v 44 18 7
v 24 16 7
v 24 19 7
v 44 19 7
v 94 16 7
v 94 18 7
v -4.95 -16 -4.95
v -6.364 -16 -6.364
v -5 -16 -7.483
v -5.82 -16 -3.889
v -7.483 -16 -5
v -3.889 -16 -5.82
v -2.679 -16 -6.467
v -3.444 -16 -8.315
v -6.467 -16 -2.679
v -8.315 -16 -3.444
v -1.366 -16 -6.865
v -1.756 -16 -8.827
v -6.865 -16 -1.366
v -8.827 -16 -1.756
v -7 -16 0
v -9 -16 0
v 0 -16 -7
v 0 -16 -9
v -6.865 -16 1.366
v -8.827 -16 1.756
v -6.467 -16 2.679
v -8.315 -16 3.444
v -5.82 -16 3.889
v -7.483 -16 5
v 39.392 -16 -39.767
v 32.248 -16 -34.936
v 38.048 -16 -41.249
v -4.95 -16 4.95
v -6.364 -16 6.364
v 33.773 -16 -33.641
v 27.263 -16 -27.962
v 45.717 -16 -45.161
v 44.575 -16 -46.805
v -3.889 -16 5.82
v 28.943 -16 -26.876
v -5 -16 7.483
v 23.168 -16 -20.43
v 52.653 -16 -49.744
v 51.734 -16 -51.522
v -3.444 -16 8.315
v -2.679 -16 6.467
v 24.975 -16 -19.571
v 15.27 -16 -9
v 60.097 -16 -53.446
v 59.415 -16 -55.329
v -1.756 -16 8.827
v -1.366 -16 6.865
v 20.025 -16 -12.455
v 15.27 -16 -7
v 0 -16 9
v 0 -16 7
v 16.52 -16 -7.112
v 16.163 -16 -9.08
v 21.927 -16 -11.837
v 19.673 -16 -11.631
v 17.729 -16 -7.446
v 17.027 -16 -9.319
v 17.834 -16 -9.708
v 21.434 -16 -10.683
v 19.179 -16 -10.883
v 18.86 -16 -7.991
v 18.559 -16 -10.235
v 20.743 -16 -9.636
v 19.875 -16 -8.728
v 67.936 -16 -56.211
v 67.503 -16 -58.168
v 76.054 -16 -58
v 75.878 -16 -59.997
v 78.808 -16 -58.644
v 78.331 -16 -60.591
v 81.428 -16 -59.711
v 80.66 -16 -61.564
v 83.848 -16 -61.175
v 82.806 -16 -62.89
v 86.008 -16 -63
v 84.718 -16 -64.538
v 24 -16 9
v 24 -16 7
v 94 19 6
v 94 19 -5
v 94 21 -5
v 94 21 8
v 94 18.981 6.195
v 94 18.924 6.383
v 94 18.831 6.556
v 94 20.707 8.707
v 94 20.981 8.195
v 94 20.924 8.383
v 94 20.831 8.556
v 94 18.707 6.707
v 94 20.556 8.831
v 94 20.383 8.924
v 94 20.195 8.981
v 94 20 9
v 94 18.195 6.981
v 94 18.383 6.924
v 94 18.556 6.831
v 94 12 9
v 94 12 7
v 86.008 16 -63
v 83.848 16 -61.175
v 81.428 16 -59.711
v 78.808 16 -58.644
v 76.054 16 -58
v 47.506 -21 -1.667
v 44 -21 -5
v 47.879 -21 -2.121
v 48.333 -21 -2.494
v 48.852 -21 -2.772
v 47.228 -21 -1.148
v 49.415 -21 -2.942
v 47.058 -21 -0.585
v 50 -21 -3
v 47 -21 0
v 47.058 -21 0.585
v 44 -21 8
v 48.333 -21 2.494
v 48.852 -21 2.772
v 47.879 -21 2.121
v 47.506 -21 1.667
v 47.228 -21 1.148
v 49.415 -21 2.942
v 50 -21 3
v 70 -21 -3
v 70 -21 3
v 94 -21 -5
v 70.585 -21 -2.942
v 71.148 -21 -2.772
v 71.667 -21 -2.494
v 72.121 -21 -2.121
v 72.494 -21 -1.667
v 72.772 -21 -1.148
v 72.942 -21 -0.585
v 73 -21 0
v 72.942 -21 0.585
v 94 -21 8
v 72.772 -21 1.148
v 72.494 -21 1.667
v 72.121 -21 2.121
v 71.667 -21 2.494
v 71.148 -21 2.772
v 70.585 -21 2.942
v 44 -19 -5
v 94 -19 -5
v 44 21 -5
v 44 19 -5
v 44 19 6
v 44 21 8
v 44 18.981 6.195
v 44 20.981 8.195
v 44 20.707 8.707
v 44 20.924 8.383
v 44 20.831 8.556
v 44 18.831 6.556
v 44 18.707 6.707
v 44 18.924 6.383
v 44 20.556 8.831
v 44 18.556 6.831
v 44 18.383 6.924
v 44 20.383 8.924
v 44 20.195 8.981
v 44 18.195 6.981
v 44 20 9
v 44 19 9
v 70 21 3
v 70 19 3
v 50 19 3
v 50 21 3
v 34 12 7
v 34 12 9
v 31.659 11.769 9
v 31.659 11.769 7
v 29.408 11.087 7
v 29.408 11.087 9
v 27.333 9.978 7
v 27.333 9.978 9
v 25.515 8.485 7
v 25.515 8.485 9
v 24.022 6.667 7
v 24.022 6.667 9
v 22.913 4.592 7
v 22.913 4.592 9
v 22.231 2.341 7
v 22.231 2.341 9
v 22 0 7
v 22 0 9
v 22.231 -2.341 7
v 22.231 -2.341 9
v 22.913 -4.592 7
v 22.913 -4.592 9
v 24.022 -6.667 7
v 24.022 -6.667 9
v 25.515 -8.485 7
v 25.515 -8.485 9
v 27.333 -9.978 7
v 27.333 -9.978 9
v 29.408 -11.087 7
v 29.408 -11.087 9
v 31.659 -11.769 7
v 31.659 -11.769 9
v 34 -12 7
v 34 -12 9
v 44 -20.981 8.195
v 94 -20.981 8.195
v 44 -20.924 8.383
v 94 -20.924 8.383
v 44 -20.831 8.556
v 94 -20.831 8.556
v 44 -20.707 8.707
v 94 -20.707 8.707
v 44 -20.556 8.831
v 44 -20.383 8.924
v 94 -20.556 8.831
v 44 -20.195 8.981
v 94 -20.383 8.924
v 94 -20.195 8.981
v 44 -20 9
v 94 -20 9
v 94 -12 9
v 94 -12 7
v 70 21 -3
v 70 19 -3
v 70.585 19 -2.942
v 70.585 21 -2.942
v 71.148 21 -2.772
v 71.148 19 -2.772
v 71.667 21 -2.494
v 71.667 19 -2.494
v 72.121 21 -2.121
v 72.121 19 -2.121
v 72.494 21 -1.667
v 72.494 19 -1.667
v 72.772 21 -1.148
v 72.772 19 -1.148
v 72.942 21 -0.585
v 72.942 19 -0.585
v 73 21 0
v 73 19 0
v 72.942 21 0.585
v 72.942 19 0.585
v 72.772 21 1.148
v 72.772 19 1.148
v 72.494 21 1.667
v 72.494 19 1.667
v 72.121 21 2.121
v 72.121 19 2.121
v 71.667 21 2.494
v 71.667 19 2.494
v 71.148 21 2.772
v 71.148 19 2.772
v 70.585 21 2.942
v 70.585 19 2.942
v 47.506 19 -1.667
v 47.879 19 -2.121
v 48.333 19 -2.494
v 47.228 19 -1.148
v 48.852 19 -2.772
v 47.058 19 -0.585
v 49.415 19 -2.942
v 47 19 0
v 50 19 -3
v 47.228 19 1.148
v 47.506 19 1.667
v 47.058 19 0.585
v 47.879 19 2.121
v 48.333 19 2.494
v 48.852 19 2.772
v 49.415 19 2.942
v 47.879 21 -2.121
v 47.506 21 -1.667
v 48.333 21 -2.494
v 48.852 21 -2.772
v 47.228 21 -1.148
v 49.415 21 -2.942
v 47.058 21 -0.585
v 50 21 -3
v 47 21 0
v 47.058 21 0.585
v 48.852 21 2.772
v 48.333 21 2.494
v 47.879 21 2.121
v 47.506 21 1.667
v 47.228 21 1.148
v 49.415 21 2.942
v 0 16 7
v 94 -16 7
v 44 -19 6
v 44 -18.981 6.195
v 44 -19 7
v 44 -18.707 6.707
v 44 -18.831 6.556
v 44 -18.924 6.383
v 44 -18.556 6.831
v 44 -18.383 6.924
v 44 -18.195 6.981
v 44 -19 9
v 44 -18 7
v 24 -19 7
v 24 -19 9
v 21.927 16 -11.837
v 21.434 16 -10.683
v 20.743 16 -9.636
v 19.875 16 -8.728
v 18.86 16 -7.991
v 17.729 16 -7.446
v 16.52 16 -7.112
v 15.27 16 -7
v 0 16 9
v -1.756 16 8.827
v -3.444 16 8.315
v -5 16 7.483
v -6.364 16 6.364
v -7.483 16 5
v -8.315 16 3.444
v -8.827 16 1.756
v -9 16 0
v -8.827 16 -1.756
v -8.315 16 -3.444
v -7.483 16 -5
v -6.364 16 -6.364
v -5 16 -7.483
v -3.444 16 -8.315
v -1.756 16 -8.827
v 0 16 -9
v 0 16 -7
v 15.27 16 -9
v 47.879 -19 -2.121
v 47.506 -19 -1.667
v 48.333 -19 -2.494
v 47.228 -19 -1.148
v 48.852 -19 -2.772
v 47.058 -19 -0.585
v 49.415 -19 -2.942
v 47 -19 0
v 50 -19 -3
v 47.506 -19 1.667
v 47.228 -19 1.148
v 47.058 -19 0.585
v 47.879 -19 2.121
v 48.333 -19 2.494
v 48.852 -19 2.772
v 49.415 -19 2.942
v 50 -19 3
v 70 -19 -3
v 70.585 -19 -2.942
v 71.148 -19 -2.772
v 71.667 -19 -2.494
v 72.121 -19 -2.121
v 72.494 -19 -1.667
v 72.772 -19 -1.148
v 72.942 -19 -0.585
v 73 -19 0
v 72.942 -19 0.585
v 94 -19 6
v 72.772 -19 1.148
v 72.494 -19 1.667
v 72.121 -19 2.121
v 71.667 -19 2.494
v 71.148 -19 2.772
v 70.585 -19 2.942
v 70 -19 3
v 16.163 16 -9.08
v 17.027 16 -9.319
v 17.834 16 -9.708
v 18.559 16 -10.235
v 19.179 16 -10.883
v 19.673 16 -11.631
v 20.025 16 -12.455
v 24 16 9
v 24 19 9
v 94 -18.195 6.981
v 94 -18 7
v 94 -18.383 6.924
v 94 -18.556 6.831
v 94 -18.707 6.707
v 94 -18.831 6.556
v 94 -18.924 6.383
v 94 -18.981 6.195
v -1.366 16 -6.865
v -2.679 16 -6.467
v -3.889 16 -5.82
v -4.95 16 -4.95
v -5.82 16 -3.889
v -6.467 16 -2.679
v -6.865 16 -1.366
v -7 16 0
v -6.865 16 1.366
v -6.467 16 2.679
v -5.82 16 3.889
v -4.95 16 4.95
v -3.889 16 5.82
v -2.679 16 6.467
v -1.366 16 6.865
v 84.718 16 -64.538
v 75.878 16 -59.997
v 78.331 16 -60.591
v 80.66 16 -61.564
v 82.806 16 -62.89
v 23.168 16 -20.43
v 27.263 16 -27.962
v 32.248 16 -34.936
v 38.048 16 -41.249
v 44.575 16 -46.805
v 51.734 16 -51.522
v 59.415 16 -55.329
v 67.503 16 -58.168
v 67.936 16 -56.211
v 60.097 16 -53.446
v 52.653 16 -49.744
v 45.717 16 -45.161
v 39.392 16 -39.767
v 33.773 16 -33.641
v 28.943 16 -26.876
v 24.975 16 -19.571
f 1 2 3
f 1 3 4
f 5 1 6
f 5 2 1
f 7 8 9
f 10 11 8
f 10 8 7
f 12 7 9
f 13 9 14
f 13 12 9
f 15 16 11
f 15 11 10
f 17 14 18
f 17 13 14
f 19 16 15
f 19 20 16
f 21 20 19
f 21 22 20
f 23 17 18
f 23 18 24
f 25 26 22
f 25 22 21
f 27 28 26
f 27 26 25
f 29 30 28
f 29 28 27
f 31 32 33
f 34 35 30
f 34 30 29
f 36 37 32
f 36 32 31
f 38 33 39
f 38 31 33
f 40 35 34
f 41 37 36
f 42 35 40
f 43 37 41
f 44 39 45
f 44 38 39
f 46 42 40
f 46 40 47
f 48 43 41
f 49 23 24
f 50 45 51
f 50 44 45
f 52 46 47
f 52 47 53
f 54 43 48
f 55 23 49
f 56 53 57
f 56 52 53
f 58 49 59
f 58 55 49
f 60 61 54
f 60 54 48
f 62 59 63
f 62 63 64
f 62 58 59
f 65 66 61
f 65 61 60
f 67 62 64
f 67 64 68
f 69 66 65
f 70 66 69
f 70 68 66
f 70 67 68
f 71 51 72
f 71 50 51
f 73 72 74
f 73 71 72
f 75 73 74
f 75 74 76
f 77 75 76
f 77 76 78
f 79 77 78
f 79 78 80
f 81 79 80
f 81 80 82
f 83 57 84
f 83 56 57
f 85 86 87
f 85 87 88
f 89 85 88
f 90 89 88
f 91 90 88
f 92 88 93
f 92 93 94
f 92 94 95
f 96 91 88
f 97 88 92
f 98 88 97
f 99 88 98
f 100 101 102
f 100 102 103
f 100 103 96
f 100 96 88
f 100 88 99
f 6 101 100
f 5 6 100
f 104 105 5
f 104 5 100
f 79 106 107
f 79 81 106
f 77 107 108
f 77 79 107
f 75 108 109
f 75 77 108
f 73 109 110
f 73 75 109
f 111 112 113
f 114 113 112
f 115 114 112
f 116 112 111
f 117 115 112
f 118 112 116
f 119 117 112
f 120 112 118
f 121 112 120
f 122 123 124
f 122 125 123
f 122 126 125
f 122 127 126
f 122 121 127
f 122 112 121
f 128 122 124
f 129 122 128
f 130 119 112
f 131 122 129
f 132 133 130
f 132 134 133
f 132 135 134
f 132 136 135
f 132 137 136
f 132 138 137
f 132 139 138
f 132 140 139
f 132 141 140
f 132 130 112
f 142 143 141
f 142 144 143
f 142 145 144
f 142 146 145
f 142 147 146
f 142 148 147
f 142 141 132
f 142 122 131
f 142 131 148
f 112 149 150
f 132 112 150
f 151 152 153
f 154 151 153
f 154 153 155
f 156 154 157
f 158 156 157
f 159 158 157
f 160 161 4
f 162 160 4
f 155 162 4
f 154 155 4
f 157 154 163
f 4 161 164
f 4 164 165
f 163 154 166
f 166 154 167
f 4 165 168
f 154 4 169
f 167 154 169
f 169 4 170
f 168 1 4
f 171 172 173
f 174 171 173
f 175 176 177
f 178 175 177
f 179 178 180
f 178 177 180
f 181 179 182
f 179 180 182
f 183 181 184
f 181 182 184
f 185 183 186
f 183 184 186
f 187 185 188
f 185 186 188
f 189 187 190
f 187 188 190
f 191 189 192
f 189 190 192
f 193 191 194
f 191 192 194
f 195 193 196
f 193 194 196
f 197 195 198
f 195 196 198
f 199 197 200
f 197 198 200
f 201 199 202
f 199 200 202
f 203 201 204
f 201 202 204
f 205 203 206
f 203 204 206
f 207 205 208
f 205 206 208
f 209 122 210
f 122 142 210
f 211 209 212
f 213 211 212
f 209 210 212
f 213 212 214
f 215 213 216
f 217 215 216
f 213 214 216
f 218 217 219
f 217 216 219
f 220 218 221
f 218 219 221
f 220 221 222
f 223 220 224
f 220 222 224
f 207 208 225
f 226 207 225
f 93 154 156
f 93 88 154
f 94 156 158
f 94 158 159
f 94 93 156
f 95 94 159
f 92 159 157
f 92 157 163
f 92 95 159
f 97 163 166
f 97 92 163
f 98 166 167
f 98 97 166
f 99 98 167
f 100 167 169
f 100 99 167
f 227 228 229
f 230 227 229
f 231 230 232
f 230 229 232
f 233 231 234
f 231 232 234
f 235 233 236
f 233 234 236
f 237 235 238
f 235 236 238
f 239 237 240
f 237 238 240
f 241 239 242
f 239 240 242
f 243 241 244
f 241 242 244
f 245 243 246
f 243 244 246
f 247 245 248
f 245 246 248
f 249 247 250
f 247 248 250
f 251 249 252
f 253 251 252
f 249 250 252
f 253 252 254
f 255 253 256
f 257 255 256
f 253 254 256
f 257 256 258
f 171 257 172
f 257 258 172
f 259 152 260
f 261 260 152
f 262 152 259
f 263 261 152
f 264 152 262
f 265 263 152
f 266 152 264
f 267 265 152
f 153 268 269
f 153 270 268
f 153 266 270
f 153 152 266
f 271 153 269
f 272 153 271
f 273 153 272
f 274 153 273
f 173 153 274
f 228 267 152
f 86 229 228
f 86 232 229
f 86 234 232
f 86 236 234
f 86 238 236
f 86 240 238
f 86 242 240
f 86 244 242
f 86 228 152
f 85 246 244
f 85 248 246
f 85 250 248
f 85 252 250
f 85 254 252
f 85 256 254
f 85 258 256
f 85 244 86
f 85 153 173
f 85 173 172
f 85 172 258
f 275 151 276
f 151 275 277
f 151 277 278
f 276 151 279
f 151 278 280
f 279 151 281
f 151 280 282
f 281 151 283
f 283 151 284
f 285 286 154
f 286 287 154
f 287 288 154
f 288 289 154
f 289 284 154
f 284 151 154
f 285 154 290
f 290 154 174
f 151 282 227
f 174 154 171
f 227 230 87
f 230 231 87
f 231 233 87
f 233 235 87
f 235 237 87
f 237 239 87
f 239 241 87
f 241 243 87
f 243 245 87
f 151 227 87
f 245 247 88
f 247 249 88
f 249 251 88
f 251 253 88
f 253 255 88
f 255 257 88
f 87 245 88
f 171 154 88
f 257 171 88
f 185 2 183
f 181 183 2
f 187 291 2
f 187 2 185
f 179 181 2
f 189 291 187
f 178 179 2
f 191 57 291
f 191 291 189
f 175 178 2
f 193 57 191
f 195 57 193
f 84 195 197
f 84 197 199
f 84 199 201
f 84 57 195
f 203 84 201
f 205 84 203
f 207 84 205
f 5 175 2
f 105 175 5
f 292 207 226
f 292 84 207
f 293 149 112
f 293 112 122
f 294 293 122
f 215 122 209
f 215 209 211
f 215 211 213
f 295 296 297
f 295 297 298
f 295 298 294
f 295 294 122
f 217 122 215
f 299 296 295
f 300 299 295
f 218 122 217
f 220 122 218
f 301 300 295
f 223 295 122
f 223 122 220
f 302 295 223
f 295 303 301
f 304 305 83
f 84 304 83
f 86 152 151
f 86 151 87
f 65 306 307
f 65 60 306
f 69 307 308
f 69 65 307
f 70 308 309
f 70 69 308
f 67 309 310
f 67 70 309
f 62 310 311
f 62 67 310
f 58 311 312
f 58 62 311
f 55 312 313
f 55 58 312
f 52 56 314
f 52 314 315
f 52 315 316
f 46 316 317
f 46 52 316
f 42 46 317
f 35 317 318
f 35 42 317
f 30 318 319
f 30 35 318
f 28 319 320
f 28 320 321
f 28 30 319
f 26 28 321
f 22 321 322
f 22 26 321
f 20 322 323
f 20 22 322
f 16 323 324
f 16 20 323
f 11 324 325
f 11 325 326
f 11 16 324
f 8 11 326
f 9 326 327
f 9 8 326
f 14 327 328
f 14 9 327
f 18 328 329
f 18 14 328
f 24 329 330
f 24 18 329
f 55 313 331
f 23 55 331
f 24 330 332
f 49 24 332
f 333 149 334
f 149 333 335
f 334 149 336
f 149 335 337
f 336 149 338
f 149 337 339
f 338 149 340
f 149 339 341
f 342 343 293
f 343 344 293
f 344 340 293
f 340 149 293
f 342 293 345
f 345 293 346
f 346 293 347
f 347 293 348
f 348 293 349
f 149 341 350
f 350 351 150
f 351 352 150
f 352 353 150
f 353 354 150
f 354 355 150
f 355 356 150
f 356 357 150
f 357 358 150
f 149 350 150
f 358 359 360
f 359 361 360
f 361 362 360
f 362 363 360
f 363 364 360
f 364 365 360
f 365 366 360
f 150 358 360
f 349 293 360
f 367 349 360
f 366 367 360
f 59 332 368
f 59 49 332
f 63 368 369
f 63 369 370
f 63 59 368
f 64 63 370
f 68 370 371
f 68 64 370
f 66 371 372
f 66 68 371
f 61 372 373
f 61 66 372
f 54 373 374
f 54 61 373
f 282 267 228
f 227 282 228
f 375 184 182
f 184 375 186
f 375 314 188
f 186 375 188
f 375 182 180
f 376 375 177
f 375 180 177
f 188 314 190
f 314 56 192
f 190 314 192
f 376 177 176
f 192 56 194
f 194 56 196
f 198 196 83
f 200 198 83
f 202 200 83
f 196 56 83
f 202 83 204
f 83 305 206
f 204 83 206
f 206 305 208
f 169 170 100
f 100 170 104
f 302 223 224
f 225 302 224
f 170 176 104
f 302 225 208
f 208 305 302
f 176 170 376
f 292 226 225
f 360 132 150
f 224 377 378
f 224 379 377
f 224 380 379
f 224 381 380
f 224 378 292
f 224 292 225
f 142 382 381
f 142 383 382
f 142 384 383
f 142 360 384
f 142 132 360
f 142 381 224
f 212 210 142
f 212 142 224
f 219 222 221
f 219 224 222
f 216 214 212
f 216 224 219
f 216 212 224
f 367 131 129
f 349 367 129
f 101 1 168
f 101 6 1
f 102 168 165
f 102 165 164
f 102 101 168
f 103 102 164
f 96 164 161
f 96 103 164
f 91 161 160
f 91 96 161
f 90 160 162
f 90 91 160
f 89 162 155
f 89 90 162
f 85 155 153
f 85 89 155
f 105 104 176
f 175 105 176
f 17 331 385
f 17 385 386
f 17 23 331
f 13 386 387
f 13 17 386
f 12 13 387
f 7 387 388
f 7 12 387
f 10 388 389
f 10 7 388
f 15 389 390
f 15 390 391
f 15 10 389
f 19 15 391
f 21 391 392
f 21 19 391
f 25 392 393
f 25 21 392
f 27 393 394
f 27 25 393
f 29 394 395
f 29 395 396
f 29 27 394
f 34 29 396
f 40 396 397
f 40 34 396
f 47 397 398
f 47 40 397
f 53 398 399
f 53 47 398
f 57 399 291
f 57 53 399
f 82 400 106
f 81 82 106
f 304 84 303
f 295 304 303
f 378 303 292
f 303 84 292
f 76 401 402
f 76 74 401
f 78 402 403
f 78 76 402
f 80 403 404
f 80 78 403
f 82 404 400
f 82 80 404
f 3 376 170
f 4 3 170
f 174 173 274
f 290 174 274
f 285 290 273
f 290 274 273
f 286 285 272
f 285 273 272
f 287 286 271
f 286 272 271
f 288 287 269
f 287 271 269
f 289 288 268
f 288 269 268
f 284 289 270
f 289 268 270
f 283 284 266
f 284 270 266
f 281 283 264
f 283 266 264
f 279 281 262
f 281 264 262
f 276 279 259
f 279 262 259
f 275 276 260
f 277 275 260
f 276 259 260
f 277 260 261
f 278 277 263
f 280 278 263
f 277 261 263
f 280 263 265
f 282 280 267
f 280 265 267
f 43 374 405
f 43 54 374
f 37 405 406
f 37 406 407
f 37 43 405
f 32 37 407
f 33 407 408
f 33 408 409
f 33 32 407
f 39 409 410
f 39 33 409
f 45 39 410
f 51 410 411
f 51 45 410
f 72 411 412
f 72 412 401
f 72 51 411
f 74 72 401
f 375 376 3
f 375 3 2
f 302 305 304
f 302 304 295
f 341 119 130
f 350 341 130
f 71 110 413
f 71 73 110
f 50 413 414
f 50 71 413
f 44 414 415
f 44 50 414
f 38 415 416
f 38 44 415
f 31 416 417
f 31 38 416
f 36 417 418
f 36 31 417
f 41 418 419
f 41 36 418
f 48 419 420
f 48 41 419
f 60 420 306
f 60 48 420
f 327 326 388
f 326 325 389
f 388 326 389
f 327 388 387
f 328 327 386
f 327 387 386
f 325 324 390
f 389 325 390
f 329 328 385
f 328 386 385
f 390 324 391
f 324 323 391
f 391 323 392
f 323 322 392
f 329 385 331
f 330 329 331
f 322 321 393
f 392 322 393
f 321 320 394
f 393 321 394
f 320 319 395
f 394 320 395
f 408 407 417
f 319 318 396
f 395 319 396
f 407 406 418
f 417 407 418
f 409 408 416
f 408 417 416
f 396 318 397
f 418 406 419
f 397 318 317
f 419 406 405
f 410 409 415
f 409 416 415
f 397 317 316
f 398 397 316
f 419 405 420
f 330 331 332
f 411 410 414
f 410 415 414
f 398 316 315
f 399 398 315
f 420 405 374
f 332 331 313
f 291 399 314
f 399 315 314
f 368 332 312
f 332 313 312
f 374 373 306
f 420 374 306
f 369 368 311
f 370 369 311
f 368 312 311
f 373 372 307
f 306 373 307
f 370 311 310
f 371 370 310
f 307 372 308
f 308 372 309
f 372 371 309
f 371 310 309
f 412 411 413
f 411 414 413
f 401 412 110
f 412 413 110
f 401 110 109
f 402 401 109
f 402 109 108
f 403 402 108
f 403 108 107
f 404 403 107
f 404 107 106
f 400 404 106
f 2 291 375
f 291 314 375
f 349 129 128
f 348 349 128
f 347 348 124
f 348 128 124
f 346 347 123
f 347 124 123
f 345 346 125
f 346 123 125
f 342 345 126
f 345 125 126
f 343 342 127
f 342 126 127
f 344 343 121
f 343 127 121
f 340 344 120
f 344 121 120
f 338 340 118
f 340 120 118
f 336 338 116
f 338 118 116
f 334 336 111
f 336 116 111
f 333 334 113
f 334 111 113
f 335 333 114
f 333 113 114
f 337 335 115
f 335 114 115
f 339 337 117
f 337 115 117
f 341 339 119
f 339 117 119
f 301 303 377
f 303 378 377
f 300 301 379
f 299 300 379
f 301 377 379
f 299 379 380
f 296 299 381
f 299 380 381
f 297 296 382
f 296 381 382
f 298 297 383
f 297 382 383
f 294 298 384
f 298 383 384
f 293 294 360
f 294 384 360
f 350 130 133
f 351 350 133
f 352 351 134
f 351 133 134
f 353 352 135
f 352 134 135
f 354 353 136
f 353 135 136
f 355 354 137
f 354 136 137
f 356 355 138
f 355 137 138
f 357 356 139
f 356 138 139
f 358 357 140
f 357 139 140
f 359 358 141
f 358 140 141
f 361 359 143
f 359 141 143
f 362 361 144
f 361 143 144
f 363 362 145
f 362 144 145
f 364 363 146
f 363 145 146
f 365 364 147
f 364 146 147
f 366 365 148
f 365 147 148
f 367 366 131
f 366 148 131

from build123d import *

# Parameters (mm, degrees)
F1_DEPTH  = 16
F2_W      = 70
F2_H      = 3
F3_DEPTH  = 2
F4_W      = 50
F4_H      = 14
F5_DEPTH  = 2
F6_R      = 1
F9_DEPTH  = 2
F11_DEPTH = 42.001


with BuildPart() as f1:
    # F0 (on Front) → F1 (new body)
    with BuildSketch(Plane.XZ):
        with BuildLine():
            Line((94, 9), (0, 9))
            ThreePointArc((0, 9), (-9, 0), (0, -9))
            Line((0, -9), (15.2698143006, -9))
            ThreePointArc((15.2698143006, -9), (18.2087071496, -9.9548907528), (20.0250713566, -12.4548364712))
            ThreePointArc((20.0250713566, -12.4548364712), (41.226339877, -44.1268775333), (75.8783002618, -59.9967739854))
            ThreePointArc((75.8783002618, -59.9967739854), (80.6596281551, -61.5636317865), (84.7179401809, -64.5378952739))
            Line((84.7179401809, -64.5378952739), (86.0083877193, -62.9999997839))
            ThreePointArc((86.0083877193, -62.9999997839), (81.4277187811, -59.7105770288), (76.0540091245, -57.9999997839))
            ThreePointArc((76.0540091245, -57.9999997839), (42.4723911749, -42.5610388699), (21.9271739736, -11.8367711264))
            ThreePointArc((21.9271739736, -11.8367711264), (19.3842641622, -8.3368472287), (15.2698143006, -7.0000002161))
            Line((15.2698143006, -7.0000002161), (0, -7.0000002161))
            ThreePointArc((0, -7.0000002161), (-7.0000002161, 0), (0, 7.0000002161))
            Line((0, 7.0000002161), (94, 7.0000002161))
            Line((94, 7.0000002161), (94, 9))
        make_face()
    extrude(amount=F1_DEPTH)

    # F2 (on face) → F3 (join)
    with BuildSketch(Plane.XY.offset(9)):
        with Locations((59, -17.5)):
            Rectangle(F2_W, F2_H)
    extrude(amount=-F3_DEPTH)

    # F4 (on face) → F5 (join)
    with BuildSketch(Plane.XZ.offset(19)):
        with Locations((69, 2)):
            Rectangle(F4_W, F4_H)
    extrude(amount=F5_DEPTH)

    # F6
    f6_edges = [f1.edges().sort_by_distance(p)[0] for p in [
        (69, -21, 9),
        (69, -19, 7),
    ]]
    fillet(f6_edges, radius=F6_R)

    # F7: F1 across plane


with BuildPart() as f1_1:
    add(f1.part)
    add(f1.part.mirror(Plane.XZ))

    # F8 (on face) → F9 (cut)
    with BuildSketch(Plane.XY.offset(9)):
        with BuildLine():
            Line((94, 12), (34, 12))
            ThreePointArc((34, 12), (22, 0), (34, -12))
            Line((34, -12), (94, -12))
            Line((94, -12), (94, 12))
        make_face()
    extrude(amount=-F9_DEPTH, mode=Mode.SUBTRACT)

    # F10 (on face) → F11 (cut, through all)
    with BuildSketch(Plane.XZ.offset(21)):
        with BuildLine():
            ThreePointArc((50, 3), (47, 0), (50, -3))
            Line((50, -3), (70, -3))
            ThreePointArc((70, -3), (73, 0), (70, 3))
            Line((70, 3), (50, 3))
        make_face()
    extrude(amount=-F11_DEPTH, mode=Mode.SUBTRACT)


solid = f1_1.part
